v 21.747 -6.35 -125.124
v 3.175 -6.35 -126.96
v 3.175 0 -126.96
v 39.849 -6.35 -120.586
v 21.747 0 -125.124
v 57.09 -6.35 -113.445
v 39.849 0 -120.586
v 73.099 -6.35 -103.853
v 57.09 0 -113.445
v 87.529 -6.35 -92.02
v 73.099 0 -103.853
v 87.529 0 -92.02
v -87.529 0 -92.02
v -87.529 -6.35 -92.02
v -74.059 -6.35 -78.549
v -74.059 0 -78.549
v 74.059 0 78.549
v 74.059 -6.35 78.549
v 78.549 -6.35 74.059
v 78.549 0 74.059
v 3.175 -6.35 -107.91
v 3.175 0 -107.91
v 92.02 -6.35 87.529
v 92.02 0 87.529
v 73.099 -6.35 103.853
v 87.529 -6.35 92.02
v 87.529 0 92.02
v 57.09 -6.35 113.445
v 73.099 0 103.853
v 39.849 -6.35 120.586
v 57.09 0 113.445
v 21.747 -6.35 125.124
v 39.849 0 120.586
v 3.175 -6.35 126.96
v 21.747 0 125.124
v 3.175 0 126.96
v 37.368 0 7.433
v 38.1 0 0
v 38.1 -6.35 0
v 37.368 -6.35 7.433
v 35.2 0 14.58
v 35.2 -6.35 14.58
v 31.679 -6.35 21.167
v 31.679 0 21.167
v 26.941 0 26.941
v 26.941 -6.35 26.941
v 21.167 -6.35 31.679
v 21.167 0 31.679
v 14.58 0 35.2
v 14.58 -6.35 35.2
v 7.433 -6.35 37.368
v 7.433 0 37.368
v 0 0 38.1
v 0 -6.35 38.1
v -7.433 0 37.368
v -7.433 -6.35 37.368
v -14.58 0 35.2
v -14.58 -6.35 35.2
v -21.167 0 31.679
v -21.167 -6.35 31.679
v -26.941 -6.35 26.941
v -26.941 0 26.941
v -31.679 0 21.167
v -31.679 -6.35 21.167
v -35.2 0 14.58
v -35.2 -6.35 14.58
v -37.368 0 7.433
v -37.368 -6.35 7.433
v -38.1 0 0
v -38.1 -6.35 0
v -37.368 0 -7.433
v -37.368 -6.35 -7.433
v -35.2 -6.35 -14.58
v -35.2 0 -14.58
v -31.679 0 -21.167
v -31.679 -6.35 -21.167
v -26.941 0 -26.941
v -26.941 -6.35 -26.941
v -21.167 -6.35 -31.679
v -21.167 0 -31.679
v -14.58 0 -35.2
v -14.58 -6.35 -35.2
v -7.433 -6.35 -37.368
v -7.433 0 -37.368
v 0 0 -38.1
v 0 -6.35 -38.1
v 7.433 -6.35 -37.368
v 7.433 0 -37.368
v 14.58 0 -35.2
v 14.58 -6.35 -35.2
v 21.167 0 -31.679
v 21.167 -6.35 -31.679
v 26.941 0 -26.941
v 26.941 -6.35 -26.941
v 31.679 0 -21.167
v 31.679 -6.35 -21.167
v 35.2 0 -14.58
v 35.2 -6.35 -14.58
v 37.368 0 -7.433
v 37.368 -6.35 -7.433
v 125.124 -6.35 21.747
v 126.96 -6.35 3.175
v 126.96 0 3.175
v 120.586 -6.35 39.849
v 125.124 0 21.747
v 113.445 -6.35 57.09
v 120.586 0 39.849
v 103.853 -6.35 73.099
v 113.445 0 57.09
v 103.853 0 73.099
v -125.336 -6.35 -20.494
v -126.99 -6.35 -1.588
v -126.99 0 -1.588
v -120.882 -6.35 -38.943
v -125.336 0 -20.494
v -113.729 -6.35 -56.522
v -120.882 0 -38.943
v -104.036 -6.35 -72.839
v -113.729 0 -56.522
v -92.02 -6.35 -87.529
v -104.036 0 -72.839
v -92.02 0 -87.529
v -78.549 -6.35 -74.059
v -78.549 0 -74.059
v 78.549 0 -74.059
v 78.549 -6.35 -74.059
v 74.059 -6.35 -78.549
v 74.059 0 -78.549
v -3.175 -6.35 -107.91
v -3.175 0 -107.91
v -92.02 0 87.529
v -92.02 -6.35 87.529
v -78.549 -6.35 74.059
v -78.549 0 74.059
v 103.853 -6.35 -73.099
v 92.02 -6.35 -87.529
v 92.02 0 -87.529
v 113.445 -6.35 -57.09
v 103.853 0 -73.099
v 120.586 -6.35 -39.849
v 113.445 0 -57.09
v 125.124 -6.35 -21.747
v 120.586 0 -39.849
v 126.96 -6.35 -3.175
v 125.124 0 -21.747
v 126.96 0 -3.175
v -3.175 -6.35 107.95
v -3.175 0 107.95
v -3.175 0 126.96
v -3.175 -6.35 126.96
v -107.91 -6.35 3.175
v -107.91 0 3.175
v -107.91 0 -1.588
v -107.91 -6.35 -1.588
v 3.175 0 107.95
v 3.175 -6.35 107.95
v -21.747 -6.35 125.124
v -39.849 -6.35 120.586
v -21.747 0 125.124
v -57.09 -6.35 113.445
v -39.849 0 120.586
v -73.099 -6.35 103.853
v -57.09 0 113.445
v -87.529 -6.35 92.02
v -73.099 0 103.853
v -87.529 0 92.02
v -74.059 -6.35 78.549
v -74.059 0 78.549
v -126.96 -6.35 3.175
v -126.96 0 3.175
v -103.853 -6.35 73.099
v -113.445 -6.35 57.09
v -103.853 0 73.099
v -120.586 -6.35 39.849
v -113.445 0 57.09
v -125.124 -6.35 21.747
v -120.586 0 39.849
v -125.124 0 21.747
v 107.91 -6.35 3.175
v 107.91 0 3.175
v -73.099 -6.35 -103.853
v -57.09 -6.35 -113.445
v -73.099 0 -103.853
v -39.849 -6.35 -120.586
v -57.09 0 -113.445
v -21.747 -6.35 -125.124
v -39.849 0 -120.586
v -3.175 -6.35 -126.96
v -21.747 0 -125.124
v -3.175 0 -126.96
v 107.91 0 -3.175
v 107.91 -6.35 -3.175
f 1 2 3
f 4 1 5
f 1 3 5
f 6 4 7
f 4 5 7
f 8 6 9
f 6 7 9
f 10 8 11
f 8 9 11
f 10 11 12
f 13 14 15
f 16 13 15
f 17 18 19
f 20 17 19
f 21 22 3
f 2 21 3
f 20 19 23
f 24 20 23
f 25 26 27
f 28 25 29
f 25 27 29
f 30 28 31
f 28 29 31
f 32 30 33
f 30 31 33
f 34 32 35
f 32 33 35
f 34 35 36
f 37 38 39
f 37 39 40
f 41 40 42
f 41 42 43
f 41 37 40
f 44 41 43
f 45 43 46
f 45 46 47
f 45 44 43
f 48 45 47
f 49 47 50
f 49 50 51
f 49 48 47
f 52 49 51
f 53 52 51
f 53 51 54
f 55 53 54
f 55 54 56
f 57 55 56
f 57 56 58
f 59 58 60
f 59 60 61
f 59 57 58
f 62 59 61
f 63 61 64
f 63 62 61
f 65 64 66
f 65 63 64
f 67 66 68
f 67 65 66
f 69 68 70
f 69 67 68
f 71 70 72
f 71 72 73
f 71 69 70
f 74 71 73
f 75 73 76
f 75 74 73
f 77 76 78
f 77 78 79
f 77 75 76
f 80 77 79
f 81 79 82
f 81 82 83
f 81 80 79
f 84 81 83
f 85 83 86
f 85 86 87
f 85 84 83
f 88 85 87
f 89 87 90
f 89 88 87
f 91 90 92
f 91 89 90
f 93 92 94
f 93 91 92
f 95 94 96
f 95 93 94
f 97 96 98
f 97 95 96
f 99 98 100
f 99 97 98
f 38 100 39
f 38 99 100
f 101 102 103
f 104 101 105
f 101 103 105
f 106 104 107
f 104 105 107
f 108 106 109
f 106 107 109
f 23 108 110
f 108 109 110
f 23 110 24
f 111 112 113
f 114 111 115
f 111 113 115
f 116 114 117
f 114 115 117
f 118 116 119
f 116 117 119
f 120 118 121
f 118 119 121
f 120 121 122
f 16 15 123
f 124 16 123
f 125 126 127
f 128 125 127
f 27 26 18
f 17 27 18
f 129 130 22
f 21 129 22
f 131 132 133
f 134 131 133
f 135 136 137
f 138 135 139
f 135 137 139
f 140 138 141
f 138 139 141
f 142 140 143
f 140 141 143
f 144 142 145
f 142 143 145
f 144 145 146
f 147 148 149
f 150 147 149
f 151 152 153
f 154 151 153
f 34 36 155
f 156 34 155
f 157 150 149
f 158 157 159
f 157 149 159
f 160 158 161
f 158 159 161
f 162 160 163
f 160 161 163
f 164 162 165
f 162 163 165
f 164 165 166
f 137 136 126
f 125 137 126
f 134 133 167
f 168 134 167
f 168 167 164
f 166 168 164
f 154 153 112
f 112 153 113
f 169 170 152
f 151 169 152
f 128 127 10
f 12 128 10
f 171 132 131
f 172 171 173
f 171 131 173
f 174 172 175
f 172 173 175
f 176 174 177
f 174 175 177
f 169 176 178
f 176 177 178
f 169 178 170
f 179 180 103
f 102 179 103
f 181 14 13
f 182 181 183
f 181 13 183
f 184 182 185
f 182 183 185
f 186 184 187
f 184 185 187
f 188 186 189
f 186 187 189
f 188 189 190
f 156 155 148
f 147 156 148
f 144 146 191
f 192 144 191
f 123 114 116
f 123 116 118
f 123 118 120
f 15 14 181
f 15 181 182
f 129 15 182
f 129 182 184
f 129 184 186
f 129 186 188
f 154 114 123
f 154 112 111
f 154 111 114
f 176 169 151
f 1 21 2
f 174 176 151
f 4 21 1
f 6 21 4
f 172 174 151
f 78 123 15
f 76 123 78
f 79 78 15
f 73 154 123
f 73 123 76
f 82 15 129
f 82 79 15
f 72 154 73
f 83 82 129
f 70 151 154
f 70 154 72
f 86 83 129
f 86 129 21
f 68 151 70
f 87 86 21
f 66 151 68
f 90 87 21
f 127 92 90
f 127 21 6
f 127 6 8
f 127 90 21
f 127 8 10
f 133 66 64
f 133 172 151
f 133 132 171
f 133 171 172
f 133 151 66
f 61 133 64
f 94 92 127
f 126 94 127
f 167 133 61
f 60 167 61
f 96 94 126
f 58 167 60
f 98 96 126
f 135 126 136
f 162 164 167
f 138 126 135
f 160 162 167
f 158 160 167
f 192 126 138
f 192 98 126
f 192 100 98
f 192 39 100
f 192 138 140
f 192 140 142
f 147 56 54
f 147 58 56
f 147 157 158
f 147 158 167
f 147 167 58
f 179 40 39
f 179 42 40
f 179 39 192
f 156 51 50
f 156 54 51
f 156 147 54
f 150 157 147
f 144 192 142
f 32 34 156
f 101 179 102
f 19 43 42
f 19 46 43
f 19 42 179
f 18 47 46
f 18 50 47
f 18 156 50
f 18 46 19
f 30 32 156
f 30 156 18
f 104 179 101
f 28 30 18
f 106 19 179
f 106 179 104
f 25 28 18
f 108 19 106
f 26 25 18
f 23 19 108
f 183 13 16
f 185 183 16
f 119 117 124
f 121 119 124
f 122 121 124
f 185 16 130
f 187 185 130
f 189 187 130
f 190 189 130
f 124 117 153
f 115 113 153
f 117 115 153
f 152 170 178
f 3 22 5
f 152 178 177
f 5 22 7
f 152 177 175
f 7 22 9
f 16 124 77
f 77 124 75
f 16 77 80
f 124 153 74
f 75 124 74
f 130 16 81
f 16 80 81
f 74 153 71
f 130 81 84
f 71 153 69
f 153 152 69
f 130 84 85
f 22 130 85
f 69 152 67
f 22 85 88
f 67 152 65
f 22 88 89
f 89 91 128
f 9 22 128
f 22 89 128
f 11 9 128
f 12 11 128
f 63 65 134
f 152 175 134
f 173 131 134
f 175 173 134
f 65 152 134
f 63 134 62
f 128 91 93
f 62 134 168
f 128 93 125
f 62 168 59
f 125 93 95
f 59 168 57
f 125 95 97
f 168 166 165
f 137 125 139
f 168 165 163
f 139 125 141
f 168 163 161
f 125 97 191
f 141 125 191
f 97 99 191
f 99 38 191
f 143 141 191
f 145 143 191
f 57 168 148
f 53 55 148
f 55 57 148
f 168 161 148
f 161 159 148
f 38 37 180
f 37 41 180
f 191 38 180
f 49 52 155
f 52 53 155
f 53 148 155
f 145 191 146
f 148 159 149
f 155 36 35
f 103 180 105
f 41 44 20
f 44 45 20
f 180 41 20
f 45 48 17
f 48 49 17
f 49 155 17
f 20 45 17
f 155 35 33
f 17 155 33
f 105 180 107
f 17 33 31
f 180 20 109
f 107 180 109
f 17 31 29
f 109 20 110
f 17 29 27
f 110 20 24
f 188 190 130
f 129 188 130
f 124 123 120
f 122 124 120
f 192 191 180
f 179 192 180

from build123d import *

# Parameters (mm, degrees)
F0_R     = 38.1
F1_DEPTH = 6.35
F3_DEPTH = 25.4


with BuildPart() as f1:
    # F0 (on Front) → F1 (new body)
    with BuildSketch(Plane.XZ):
        with BuildLine():
            Line((107.910306, 3.175), (126.960306, 3.175))
            ThreePointArc((126.960306, 3.175), (89.802561, 89.802561), (3.175, 126.960306))
            Line((3.175, 126.960306), (3.175, 107.95))
            Line((3.175, 107.95), (-3.175, 107.95))
            Line((-3.175, 107.95), (-3.175, 126.960306))
            ThreePointArc((-3.175, 126.960306), (-89.802561, 89.802561), (-126.960306, 3.175))
            Line((-126.960306, 3.175), (-107.910306, 3.175))
            Line((-107.910306, 3.175), (-107.910306, -1.5875))
            Line((-107.910306, -1.5875), (-126.990078, -1.5875))
            ThreePointArc((-126.990078, -1.5875), (-90.362171, -89.239442), (-3.175, -126.960306))
            Line((-3.175, -126.960306), (-3.175, -107.910306))
            Line((-3.175, -107.910306), (3.175, -107.910306))
            Line((3.175, -107.910306), (3.175, -126.960306))
            ThreePointArc((3.175, -126.960306), (89.802561, -89.802561), (126.960306, -3.175))
            Line((126.960306, -3.175), (107.910306, -3.175))
            Line((107.910306, -3.175), (107.910306, 3.175))
        make_face()
        Circle(F0_R, mode=Mode.SUBTRACT)
    extrude(amount=F1_DEPTH)

    # F2 (on face) → F3 (cut)
    with BuildSketch(Plane.XZ.offset(6.35)):
        Polygon((74.059045, 78.549173), (76.304109, 76.304109), (78.549173, 74.059045), (92.019558, 87.529429), (97.280774, 92.737254), (92.76395, 97.254078), (87.529429, 92.019558), align=None)
        Polygon((78.549173, -74.059045), (76.304109, -76.304109), (74.059045, -78.549173), (87.529429, -92.019558), (97.125031, -102.679037), (102.767334, -97.599868), (92.019558, -87.529429), align=None)
        Polygon((-74.059045, -78.549173), (-76.304109, -76.304109), (-78.549173, -74.059045), (-92.019558, -87.529429), (-97.248051, -92.726782), (-92.600375, -97.240731), (-87.529429, -92.019558), align=None)
        Polygon((-78.549173, 74.059045), (-76.304109, 76.304109), (-74.059045, 78.549173), (-87.529429, 92.019558), (-93.063728, 97.553856), (-97.69151, 92.926074), (-92.019558, 87.529429), align=None)
    extrude(amount=-F3_DEPTH, mode=Mode.SUBTRACT)


solid = f1.part
